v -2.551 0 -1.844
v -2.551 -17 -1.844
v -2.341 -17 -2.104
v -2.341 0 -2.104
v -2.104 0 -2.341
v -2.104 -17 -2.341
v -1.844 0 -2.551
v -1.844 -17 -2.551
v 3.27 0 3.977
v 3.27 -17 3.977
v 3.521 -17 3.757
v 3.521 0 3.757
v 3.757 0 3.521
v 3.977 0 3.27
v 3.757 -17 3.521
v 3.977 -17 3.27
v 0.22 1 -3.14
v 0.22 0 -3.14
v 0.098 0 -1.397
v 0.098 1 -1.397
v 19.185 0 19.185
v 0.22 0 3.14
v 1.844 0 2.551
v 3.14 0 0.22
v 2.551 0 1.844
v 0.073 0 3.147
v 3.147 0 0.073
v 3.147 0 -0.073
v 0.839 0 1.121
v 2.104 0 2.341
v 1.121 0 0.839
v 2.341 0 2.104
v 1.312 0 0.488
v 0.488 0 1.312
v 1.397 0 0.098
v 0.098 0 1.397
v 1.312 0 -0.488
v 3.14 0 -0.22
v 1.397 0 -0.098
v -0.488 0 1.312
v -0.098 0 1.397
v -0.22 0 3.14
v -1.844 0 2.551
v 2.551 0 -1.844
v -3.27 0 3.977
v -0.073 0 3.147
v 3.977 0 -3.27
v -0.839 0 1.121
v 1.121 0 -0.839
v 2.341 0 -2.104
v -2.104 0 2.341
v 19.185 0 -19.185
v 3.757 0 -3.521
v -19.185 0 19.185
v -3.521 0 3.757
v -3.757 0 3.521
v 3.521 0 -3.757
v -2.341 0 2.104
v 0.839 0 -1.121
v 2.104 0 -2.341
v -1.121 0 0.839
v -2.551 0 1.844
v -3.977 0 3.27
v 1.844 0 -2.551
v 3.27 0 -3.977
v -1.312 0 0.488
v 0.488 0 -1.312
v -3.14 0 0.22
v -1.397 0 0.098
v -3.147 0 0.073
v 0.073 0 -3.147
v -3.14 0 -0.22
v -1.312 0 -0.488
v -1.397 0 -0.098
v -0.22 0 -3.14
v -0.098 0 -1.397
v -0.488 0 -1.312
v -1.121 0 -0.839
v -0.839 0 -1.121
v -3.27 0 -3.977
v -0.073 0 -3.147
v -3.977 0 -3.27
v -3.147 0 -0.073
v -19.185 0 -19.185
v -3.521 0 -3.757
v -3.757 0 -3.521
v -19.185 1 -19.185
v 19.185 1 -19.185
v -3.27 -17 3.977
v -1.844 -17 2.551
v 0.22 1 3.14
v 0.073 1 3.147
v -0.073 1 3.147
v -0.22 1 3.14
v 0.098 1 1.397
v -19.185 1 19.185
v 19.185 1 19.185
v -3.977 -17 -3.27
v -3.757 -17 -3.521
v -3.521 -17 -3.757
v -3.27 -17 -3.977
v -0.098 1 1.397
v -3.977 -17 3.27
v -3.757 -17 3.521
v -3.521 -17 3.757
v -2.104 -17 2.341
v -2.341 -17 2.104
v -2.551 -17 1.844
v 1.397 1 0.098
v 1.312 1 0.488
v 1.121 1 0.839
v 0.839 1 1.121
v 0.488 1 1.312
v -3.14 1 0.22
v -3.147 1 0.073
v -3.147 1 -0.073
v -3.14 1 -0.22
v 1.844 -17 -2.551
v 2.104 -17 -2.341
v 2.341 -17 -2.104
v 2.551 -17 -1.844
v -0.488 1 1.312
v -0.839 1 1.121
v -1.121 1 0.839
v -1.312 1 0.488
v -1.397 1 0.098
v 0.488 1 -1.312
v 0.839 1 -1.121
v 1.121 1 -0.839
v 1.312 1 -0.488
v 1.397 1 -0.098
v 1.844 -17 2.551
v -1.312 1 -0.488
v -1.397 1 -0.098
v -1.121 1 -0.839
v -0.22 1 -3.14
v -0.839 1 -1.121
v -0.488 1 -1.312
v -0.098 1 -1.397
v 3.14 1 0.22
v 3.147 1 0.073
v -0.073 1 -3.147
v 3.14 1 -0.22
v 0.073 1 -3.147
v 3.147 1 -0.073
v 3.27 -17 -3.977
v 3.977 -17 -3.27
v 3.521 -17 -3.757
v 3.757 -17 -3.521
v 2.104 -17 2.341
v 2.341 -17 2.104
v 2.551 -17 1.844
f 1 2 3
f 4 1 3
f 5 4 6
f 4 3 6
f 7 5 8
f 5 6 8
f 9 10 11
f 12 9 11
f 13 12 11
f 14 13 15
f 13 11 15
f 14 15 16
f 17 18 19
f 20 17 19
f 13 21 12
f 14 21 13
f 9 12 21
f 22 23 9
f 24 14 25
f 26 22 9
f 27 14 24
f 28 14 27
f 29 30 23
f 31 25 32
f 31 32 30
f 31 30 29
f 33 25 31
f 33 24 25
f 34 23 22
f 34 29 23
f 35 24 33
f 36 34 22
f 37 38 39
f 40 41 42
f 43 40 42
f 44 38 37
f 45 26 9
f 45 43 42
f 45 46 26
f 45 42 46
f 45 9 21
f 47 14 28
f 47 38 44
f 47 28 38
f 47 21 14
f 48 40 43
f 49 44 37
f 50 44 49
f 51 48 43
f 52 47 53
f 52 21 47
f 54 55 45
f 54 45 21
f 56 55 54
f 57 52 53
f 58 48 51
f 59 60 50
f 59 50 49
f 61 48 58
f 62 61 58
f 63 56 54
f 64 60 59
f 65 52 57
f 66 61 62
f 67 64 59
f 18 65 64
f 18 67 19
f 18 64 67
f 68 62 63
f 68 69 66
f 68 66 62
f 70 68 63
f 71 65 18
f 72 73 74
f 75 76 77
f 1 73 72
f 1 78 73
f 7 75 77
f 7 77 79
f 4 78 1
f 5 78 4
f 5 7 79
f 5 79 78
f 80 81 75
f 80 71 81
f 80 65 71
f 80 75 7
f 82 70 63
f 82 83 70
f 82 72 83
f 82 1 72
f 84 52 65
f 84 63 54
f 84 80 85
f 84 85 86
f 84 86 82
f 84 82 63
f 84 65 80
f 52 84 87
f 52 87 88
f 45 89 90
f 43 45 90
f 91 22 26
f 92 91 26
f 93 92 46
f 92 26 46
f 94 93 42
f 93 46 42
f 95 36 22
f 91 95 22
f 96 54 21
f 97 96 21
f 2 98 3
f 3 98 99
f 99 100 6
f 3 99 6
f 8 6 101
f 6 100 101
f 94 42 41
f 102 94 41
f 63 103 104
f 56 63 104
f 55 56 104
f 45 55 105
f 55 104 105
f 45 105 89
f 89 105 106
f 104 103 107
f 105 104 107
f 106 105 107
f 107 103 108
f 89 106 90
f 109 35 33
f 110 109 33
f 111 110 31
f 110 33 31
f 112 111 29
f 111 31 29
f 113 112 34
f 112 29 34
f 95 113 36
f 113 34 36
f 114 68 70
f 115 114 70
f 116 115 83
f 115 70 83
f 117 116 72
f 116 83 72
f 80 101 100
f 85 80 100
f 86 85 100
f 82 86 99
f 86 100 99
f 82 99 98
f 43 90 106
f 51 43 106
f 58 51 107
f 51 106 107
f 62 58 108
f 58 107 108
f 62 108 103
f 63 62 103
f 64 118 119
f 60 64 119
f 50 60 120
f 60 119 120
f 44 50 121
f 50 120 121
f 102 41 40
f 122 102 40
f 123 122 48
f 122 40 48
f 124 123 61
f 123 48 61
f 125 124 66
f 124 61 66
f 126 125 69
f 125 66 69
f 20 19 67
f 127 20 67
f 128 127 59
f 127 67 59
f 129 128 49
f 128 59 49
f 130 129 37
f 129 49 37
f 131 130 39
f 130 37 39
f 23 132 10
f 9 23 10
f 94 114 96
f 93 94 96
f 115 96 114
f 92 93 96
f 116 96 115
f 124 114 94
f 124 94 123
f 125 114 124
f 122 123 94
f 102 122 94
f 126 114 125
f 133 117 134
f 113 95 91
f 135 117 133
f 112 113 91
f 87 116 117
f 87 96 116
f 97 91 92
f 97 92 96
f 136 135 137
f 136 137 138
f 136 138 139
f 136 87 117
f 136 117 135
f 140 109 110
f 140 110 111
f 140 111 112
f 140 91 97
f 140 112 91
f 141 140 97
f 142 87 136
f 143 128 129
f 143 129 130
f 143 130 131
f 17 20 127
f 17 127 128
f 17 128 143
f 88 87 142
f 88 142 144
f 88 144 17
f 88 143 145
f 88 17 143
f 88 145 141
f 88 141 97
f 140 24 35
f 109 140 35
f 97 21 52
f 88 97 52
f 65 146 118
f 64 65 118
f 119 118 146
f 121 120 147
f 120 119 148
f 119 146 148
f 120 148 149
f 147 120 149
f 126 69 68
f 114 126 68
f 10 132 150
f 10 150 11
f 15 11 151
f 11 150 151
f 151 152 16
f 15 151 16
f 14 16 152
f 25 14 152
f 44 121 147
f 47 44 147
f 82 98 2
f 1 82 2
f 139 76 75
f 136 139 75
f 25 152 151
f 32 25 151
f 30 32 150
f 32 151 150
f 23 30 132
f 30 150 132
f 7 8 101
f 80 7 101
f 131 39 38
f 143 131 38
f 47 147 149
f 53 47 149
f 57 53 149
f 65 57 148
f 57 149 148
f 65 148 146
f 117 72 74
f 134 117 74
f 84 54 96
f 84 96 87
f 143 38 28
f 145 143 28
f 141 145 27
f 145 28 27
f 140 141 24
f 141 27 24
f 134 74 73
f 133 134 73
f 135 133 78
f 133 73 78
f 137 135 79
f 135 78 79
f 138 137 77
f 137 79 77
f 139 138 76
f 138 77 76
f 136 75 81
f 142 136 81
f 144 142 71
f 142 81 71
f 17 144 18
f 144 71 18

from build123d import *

# Parameters (mm, degrees)
SKETCH2_W           = 38.37
SKETCH2_H           = 38.37
BOSS_EXTRUDE6_DEPTH = 1
BOSS_EXTRUDE7_START = -17
BOSS_EXTRUDE7_DEPTH = 17


with BuildPart() as part:
    # Sketch2 → Boss-Extrude6 (new body)
    # profile 1 of 5: a face of its own
    with BuildSketch(Plane(origin=(0, 0, 0), x_dir=(1, 0, 0), z_dir=(0, 1, 0))):
        Rectangle(SKETCH2_W, SKETCH2_H)
        with BuildLine():
            Line((-3.976901657, -3.269794876), (-2.550972937, -1.843866156))
            ThreePointArc((-2.550972937, -1.843866156), (-2.22568027, -2.22568027), (-1.843866156, -2.550972937))
            Line((-1.843866156, -2.550972937), (-3.269794876, -3.976901657))
            ThreePointArc((-3.269794876, -3.976901657), (-3.640556642, -3.640556642), (-3.976901657, -3.269794876))
        make_face(mode=Mode.SUBTRACT)
        with BuildLine():
            Line((3.269794876, -3.976901657), (1.843866156, -2.550972937))
            ThreePointArc((1.843866156, -2.550972937), (2.22568027, -2.22568027), (2.550972937, -1.843866156))
            Line((2.550972937, -1.843866156), (3.976901657, -3.269794876))
            ThreePointArc((3.976901657, -3.269794876), (3.640556642, -3.640556642), (3.269794876, -3.976901657))
        make_face(mode=Mode.SUBTRACT)
        with BuildLine():
            ThreePointArc((-1.39658967, 0.097659063), (-0.989949494, 0.989949494), (-0.097659063, 1.39658967))
            Line((-0.097659063, 1.39658967), (-0.219564585, 3.139919858))
            ThreePointArc((-0.219564585, 3.139919858), (0, 3.147587223), (0.219564585, 3.139919858))
            Line((0.219564585, 3.139919858), (0.097659063, 1.39658967))
            ThreePointArc((0.097659063, 1.39658967), (0.989949494, 0.989949494), (1.39658967, 0.097659063))
            Line((1.39658967, 0.097659063), (3.139919858, 0.219564585))
            ThreePointArc((3.139919858, 0.219564585), (3.147587223, 0), (3.139919858, -0.219564585))
            Line((3.139919858, -0.219564585), (1.39658967, -0.097659063))
            ThreePointArc((1.39658967, -0.097659063), (0.989949494, -0.989949494), (0.097659063, -1.39658967))
            Line((0.097659063, -1.39658967), (0.219564585, -3.139919858))
            ThreePointArc((0.219564585, -3.139919858), (0, -3.147587223), (-0.219564585, -3.139919858))
            Line((-0.219564585, -3.139919858), (-0.097659063, -1.39658967))
            ThreePointArc((-0.097659063, -1.39658967), (-0.989949494, -0.989949494), (-1.39658967, -0.097659063))
            Line((-1.39658967, -0.097659063), (-3.139919858, -0.219564585))
            ThreePointArc((-3.139919858, -0.219564585), (-3.147587223, 0), (-3.139919858, 0.219564585))
            Line((-3.139919858, 0.219564585), (-1.39658967, 0.097659063))
        make_face(mode=Mode.SUBTRACT)
        with BuildLine():
            Line((-3.269794876, 3.976901657), (-1.843866156, 2.550972937))
            ThreePointArc((-1.843866156, 2.550972937), (-2.22568027, 2.22568027), (-2.550972937, 1.843866156))
            Line((-2.550972937, 1.843866156), (-3.976901657, 3.269794876))
            ThreePointArc((-3.976901657, 3.269794876), (-3.640556642, 3.640556642), (-3.269794876, 3.976901657))
        make_face(mode=Mode.SUBTRACT)
        with BuildLine():
            Line((3.976901657, 3.269794876), (2.550972937, 1.843866156))
            ThreePointArc((2.550972937, 1.843866156), (2.22568027, 2.22568027), (1.843866156, 2.550972937))
            Line((1.843866156, 2.550972937), (3.269794876, 3.976901657))
            ThreePointArc((3.269794876, 3.976901657), (3.640556642, 3.640556642), (3.976901657, 3.269794876))
        make_face(mode=Mode.SUBTRACT)
    # profile 2 of 5: a face of its own
    with BuildSketch(Plane(origin=(0, 0, 0), x_dir=(1, 0, 0), z_dir=(0, 1, 0))):
        with BuildLine():
            ThreePointArc((-3.269794876, -3.976901657), (-3.640556642, -3.640556642), (-3.976901657, -3.269794876))
            Line((-3.976901657, -3.269794876), (-2.550972937, -1.843866156))
            ThreePointArc((-2.550972937, -1.843866156), (-2.22568027, -2.22568027), (-1.843866156, -2.550972937))
            Line((-1.843866156, -2.550972937), (-3.269794876, -3.976901657))
        make_face()
    # profile 3 of 5: a face of its own
    with BuildSketch(Plane(origin=(0, 0, 0), x_dir=(1, 0, 0), z_dir=(0, 1, 0))):
        with BuildLine():
            Line((-2.550972937, 1.843866156), (-3.976901657, 3.269794876))
            ThreePointArc((-3.976901657, 3.269794876), (-3.640556642, 3.640556642), (-3.269794876, 3.976901657))
            Line((-3.269794876, 3.976901657), (-1.843866156, 2.550972937))
            ThreePointArc((-1.843866156, 2.550972937), (-2.22568027, 2.22568027), (-2.550972937, 1.843866156))
        make_face()
    # profile 4 of 5: a face of its own
    with BuildSketch(Plane(origin=(0, 0, 0), x_dir=(1, 0, 0), z_dir=(0, 1, 0))):
        with BuildLine():
            ThreePointArc((3.269794876, 3.976901657), (3.640556642, 3.640556642), (3.976901657, 3.269794876))
            Line((3.976901657, 3.269794876), (2.550972937, 1.843866156))
            ThreePointArc((2.550972937, 1.843866156), (2.22568027, 2.22568027), (1.843866156, 2.550972937))
            Line((1.843866156, 2.550972937), (3.269794876, 3.976901657))
        make_face()
    # profile 5 of 5: a face of its own
    with BuildSketch(Plane(origin=(0, 0, 0), x_dir=(1, 0, 0), z_dir=(0, 1, 0))):
        with BuildLine():
            ThreePointArc((3.976901657, -3.269794876), (3.640556642, -3.640556642), (3.269794876, -3.976901657))
            Line((3.269794876, -3.976901657), (1.843866156, -2.550972937))
            ThreePointArc((1.843866156, -2.550972937), (2.22568027, -2.22568027), (2.550972937, -1.843866156))
            Line((2.550972937, -1.843866156), (3.976901657, -3.269794876))
        make_face()
    extrude(amount=BOSS_EXTRUDE6_DEPTH)

    # Sketch7 → Boss-Extrude7 (add)
    with BuildSketch(Plane(origin=(0, 0, 0), x_dir=(1, 0, 0), z_dir=(0, 1, 0)).offset(BOSS_EXTRUDE7_START)):
        with BuildLine():
            Line((-3.976901657, 3.269794876), (-2.550972937, 1.843866156))
            ThreePointArc((-2.550972937, 1.843866156), (-2.22568027, 2.22568027), (-1.843866156, 2.550972937))
            Line((-1.843866156, 2.550972937), (-3.269794876, 3.976901657))
            ThreePointArc((-3.269794876, 3.976901657), (-3.640556642, 3.640556642), (-3.976901657, 3.269794876))
        make_face()
        with BuildLine():
            ThreePointArc((-1.843866156, -2.550972937), (-2.22568027, -2.22568027), (-2.550972937, -1.843866156))
            Line((-2.550972937, -1.843866156), (-3.976901657, -3.269794876))
            ThreePointArc((-3.976901657, -3.269794876), (-3.640556642, -3.640556642), (-3.269794876, -3.976901657))
            Line((-3.269794876, -3.976901657), (-1.843866156, -2.550972937))
        make_face()
        with BuildLine():
            Line((3.269794876, 3.976901657), (1.843866156, 2.550972937))
            ThreePointArc((1.843866156, 2.550972937), (2.22568027, 2.22568027), (2.550972937, 1.843866156))
            Line((2.550972937, 1.843866156), (3.976901657, 3.269794876))
            ThreePointArc((3.976901657, 3.269794876), (3.640556642, 3.640556642), (3.269794876, 3.976901657))
        make_face()
        with BuildLine():
            ThreePointArc((2.550972937, -1.843866156), (2.22568027, -2.22568027), (1.843866156, -2.550972937))
            Line((1.843866156, -2.550972937), (3.269794876, -3.976901657))
            ThreePointArc((3.269794876, -3.976901657), (3.640556642, -3.640556642), (3.976901657, -3.269794876))
            Line((3.976901657, -3.269794876), (2.550972937, -1.843866156))
        make_face()
    extrude(amount=BOSS_EXTRUDE7_DEPTH)


solid = part.part
